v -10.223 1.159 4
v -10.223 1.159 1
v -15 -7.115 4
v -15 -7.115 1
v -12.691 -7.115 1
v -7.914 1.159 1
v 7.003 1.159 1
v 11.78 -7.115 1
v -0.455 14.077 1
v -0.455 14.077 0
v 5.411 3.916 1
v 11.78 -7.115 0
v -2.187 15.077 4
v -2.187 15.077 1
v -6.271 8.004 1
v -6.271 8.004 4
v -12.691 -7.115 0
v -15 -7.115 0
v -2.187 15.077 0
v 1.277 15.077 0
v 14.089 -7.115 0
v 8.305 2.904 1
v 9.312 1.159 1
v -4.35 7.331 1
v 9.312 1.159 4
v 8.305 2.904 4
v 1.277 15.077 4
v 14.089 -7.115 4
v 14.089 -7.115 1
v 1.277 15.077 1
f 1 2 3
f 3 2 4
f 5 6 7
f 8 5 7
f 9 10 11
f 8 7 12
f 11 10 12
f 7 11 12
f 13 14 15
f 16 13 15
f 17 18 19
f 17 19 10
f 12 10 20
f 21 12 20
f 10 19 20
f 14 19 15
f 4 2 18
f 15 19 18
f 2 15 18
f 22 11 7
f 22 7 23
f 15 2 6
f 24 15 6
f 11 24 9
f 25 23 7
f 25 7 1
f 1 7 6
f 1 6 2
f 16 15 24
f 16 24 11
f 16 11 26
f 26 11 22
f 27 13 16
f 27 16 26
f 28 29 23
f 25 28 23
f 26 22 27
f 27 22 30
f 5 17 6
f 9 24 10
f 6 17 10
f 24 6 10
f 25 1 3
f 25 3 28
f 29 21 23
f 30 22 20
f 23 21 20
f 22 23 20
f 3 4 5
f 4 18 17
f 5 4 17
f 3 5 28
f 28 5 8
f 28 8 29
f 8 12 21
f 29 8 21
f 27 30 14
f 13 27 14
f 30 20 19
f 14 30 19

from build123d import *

# Parameters (mm, degrees)
F1_DEPTH = 1
F3_DEPTH = 3


with BuildPart() as f1:
    # F0 (on Top) → F1 (new body)
    with BuildSketch(Plane.XY):
        Polygon((-2.187478, 15.077314), (-15, -7.114624), (-12.690599, -7.114624), (-0.455428, 14.077314), (11.779744, -7.114624), (14.089145, -7.114624), (1.276623, 15.077314), align=None)
    extrude(amount=F1_DEPTH)

    # F2 (on face) → F3 (join)
    with BuildSketch(Plane.XY.offset(1)):
        Polygon((-10.223, 1.159382), (-15, -7.114624), (14.089145, -7.114624), (9.312145, 1.159382), align=None)
        Polygon((1.276623, 15.077314), (-2.187478, 15.077314), (-6.271465, 8.003641), (8.305015, 2.903783), align=None)
    extrude(amount=F3_DEPTH)


solid = f1.part
